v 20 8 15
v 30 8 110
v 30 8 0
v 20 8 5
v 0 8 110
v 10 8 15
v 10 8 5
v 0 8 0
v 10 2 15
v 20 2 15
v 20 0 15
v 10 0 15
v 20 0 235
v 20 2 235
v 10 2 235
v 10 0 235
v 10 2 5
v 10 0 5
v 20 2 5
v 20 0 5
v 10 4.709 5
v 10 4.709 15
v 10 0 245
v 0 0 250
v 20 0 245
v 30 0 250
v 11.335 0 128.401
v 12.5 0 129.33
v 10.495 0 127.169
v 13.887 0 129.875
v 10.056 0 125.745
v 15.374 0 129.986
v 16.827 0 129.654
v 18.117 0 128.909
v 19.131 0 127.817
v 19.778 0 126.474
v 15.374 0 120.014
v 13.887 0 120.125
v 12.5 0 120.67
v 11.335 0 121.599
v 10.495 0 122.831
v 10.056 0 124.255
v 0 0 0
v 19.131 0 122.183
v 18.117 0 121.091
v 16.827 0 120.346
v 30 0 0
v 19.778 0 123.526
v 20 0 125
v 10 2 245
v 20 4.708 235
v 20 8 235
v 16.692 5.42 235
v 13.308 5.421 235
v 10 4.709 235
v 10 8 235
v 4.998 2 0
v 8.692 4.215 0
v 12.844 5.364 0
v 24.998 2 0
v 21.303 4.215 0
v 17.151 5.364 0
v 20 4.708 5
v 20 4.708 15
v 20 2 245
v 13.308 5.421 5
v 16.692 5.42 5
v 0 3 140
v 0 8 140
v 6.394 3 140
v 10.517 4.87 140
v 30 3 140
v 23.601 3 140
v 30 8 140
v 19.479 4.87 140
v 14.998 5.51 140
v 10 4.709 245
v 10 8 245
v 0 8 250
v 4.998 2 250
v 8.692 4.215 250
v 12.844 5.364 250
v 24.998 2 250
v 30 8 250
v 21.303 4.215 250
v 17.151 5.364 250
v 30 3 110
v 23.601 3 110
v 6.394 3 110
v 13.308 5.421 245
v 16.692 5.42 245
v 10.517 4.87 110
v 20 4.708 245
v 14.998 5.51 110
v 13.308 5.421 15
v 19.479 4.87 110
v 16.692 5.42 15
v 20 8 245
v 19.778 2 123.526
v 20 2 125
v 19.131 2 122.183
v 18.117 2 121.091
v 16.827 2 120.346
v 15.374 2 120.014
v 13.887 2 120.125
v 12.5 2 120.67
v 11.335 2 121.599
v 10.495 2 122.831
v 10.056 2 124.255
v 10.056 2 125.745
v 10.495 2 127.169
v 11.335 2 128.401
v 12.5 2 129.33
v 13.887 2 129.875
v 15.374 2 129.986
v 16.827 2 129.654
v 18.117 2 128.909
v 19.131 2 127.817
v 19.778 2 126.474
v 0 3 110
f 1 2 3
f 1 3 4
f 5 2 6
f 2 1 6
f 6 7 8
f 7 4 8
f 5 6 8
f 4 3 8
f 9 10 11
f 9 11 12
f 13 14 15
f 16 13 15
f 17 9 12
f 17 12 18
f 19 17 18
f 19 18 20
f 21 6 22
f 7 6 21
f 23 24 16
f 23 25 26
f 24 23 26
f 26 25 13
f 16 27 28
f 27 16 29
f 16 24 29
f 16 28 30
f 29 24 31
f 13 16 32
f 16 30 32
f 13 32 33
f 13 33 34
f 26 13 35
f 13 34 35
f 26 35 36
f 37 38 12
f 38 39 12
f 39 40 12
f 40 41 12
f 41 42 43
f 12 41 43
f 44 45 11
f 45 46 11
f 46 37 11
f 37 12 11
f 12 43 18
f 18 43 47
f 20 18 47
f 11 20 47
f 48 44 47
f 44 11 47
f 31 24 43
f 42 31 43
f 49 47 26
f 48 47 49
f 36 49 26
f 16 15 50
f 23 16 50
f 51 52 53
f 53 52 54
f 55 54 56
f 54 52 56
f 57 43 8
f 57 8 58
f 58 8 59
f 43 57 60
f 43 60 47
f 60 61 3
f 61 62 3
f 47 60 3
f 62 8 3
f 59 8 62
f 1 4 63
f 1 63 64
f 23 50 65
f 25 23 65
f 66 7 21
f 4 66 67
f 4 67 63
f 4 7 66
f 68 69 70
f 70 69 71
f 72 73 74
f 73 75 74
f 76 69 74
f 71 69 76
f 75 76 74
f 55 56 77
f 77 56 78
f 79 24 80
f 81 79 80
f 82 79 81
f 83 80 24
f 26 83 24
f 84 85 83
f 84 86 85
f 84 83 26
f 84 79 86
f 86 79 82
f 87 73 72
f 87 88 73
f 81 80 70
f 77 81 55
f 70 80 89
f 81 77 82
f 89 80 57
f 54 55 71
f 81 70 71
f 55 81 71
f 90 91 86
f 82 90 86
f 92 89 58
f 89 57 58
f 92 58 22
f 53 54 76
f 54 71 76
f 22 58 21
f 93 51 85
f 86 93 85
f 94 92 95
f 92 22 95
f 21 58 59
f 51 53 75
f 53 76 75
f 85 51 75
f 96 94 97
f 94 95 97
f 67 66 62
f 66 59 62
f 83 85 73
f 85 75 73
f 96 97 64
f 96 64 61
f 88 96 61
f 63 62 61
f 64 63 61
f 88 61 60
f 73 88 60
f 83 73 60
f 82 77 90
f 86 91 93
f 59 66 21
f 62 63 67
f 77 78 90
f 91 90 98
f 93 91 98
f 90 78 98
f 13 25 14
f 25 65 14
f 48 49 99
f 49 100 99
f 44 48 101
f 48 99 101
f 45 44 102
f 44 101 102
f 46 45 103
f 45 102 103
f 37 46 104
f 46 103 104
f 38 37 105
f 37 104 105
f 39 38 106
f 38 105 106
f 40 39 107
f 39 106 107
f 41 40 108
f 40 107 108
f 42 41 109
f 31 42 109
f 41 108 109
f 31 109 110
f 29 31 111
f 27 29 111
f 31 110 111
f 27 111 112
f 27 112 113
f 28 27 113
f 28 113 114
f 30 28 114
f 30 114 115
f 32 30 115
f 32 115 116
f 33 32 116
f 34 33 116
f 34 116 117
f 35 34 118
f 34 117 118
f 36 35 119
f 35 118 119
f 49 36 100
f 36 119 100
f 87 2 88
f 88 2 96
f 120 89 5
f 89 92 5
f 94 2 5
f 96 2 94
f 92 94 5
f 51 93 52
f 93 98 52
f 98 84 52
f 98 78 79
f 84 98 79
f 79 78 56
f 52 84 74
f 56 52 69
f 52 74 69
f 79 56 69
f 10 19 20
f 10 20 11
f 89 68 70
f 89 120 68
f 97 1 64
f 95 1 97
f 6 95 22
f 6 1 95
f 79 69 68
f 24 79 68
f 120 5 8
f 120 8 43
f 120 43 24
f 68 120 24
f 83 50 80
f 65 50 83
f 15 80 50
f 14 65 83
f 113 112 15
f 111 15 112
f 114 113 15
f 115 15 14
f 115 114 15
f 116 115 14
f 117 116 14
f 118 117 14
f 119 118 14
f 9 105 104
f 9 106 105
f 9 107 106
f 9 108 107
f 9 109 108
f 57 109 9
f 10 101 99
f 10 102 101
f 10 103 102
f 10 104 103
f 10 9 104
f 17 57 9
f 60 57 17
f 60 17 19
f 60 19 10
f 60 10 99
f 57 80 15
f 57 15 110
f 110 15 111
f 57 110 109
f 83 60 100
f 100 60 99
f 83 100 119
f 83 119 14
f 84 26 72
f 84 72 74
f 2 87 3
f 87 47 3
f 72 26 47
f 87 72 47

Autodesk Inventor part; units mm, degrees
ref_plane "YZ Plane" through (0, 0, 0) normal (1, 0, 0) x (0, 1, 0)
ref_plane "XZ Plane" through (0, 0, 0) normal (0, 1, 0) x (-1, 0, 0)
ref_plane "XY Plane" through (0, 0, 0) normal (0, 0, 1) x (1, 0, 0)
sketch "Sketch1" plane through (0, 0, 0) normal (0, 0, 1) x (1, 0, 0)
  line L0 (0, 0) -> (30, 0)
  line L1 (30, 0) -> (30, 8)
  line L2 (30, 8) -> (0, 8)
  line L3 (0, 8) -> (0, 0)
  line L4 (14.9976, 2) -> (24.9976, 2)
  line L5 (14.9976, 2) -> (4.9976, 2)
  arc A0 (24.9976, 2) -> (4.9976, 2) centre (14.9976, -10.49) ccw
  dimension "d2" = 30
  dimension "d3" = 8
  dimension "d6" = 10
  dimension "d7" = 10
  dimension "d8" = 2
  dimension "d9" = 16
extrude "Extrusion1" add sketch "Sketch1" along normal blind 250
sketch "Sketch2" plane through (0, 8, 0) normal (0, 1, 0) x (1, 0, 0)
  line L0 (30, 0) -> (0, 0) projected
  line L1 (30, 0) -> (30, -250) projected
  circle A0 centre (15, -125) radius 5
  line L2 (30, -250) -> (0, -250) projected
  line L3 (10, -15) -> (10, -5)
  line L4 (10, -5) -> (20, -5)
  line L5 (20, -5) -> (20, -15)
  line L6 (20, -15) -> (10, -15)
  line L7 (10, -15) -> (20, -5) construction
  line L8 (10, -5) -> (20, -15) construction
  line L9 (0, 0) -> (0, -250) projected
  line L10 (10, -235) -> (10, -245)
  line L11 (10, -245) -> (20, -245)
  line L12 (20, -245) -> (20, -235)
  line L13 (20, -235) -> (10, -235)
  line L14 (10, -235) -> (20, -245) construction
  line L15 (10, -245) -> (20, -235) construction
  point P0 (15, 0)
  point P1 (30, -125)
  point P2 (15, -5)
  point P3 (15, -10)
  point P4 (15, -240)
  point P5 (15, -245)
  dimension "d13" = 10
  dimension "d14" = 120
  dimension "d16" = 0
  dimension "d17" = 125
  dimension "d19" = 5
  dimension "d20" = 10
  dimension "d21" = 10
  dimension "d22" = 5
  dimension "d23" = 10
  dimension "d24" = 5
  dimension "d25" = 5
  dimension "d26" = 10
extrude "Extrusion2" cut sketch "Sketch2" against normal up to surface (8 mm away) from surface at 0 contours A0 | L3 L4 L5 L6 | L13 L12 L11 L10
sketch "Sketch3" plane through (0, 8, 0) normal (0, 1, 0) x (1, 0, 0)
  line L0 (30, 0) -> (30, -250) projected
  line L1 (30, 0) -> (0, 0) projected
  line L2 (0, -140) -> (30, -140)
  line L3 (30, -140) -> (30, -110)
  line L4 (30, -110) -> (0, -110)
  line L5 (0, -110) -> (0, -140)
  line L6 (0, -140) -> (30, -110) construction
  line L7 (30, -140) -> (0, -110) construction
  line L8 (4.9976, 0) -> (4.9976, -250) projected
  point P0 (30, -125)
  point P1 (15, 0)
  point P2 (15, -125)
  dimension "d29" = 15
  dimension "d30" = 125
  dimension "d31" = 30
  dimension "d32" = 30
extrude "Extrusion3" cut sketch "Sketch3" against normal blind 5 contours L0 L2 L8 L4 | L8 L2 L5 L4
properties part number "bridge1"
